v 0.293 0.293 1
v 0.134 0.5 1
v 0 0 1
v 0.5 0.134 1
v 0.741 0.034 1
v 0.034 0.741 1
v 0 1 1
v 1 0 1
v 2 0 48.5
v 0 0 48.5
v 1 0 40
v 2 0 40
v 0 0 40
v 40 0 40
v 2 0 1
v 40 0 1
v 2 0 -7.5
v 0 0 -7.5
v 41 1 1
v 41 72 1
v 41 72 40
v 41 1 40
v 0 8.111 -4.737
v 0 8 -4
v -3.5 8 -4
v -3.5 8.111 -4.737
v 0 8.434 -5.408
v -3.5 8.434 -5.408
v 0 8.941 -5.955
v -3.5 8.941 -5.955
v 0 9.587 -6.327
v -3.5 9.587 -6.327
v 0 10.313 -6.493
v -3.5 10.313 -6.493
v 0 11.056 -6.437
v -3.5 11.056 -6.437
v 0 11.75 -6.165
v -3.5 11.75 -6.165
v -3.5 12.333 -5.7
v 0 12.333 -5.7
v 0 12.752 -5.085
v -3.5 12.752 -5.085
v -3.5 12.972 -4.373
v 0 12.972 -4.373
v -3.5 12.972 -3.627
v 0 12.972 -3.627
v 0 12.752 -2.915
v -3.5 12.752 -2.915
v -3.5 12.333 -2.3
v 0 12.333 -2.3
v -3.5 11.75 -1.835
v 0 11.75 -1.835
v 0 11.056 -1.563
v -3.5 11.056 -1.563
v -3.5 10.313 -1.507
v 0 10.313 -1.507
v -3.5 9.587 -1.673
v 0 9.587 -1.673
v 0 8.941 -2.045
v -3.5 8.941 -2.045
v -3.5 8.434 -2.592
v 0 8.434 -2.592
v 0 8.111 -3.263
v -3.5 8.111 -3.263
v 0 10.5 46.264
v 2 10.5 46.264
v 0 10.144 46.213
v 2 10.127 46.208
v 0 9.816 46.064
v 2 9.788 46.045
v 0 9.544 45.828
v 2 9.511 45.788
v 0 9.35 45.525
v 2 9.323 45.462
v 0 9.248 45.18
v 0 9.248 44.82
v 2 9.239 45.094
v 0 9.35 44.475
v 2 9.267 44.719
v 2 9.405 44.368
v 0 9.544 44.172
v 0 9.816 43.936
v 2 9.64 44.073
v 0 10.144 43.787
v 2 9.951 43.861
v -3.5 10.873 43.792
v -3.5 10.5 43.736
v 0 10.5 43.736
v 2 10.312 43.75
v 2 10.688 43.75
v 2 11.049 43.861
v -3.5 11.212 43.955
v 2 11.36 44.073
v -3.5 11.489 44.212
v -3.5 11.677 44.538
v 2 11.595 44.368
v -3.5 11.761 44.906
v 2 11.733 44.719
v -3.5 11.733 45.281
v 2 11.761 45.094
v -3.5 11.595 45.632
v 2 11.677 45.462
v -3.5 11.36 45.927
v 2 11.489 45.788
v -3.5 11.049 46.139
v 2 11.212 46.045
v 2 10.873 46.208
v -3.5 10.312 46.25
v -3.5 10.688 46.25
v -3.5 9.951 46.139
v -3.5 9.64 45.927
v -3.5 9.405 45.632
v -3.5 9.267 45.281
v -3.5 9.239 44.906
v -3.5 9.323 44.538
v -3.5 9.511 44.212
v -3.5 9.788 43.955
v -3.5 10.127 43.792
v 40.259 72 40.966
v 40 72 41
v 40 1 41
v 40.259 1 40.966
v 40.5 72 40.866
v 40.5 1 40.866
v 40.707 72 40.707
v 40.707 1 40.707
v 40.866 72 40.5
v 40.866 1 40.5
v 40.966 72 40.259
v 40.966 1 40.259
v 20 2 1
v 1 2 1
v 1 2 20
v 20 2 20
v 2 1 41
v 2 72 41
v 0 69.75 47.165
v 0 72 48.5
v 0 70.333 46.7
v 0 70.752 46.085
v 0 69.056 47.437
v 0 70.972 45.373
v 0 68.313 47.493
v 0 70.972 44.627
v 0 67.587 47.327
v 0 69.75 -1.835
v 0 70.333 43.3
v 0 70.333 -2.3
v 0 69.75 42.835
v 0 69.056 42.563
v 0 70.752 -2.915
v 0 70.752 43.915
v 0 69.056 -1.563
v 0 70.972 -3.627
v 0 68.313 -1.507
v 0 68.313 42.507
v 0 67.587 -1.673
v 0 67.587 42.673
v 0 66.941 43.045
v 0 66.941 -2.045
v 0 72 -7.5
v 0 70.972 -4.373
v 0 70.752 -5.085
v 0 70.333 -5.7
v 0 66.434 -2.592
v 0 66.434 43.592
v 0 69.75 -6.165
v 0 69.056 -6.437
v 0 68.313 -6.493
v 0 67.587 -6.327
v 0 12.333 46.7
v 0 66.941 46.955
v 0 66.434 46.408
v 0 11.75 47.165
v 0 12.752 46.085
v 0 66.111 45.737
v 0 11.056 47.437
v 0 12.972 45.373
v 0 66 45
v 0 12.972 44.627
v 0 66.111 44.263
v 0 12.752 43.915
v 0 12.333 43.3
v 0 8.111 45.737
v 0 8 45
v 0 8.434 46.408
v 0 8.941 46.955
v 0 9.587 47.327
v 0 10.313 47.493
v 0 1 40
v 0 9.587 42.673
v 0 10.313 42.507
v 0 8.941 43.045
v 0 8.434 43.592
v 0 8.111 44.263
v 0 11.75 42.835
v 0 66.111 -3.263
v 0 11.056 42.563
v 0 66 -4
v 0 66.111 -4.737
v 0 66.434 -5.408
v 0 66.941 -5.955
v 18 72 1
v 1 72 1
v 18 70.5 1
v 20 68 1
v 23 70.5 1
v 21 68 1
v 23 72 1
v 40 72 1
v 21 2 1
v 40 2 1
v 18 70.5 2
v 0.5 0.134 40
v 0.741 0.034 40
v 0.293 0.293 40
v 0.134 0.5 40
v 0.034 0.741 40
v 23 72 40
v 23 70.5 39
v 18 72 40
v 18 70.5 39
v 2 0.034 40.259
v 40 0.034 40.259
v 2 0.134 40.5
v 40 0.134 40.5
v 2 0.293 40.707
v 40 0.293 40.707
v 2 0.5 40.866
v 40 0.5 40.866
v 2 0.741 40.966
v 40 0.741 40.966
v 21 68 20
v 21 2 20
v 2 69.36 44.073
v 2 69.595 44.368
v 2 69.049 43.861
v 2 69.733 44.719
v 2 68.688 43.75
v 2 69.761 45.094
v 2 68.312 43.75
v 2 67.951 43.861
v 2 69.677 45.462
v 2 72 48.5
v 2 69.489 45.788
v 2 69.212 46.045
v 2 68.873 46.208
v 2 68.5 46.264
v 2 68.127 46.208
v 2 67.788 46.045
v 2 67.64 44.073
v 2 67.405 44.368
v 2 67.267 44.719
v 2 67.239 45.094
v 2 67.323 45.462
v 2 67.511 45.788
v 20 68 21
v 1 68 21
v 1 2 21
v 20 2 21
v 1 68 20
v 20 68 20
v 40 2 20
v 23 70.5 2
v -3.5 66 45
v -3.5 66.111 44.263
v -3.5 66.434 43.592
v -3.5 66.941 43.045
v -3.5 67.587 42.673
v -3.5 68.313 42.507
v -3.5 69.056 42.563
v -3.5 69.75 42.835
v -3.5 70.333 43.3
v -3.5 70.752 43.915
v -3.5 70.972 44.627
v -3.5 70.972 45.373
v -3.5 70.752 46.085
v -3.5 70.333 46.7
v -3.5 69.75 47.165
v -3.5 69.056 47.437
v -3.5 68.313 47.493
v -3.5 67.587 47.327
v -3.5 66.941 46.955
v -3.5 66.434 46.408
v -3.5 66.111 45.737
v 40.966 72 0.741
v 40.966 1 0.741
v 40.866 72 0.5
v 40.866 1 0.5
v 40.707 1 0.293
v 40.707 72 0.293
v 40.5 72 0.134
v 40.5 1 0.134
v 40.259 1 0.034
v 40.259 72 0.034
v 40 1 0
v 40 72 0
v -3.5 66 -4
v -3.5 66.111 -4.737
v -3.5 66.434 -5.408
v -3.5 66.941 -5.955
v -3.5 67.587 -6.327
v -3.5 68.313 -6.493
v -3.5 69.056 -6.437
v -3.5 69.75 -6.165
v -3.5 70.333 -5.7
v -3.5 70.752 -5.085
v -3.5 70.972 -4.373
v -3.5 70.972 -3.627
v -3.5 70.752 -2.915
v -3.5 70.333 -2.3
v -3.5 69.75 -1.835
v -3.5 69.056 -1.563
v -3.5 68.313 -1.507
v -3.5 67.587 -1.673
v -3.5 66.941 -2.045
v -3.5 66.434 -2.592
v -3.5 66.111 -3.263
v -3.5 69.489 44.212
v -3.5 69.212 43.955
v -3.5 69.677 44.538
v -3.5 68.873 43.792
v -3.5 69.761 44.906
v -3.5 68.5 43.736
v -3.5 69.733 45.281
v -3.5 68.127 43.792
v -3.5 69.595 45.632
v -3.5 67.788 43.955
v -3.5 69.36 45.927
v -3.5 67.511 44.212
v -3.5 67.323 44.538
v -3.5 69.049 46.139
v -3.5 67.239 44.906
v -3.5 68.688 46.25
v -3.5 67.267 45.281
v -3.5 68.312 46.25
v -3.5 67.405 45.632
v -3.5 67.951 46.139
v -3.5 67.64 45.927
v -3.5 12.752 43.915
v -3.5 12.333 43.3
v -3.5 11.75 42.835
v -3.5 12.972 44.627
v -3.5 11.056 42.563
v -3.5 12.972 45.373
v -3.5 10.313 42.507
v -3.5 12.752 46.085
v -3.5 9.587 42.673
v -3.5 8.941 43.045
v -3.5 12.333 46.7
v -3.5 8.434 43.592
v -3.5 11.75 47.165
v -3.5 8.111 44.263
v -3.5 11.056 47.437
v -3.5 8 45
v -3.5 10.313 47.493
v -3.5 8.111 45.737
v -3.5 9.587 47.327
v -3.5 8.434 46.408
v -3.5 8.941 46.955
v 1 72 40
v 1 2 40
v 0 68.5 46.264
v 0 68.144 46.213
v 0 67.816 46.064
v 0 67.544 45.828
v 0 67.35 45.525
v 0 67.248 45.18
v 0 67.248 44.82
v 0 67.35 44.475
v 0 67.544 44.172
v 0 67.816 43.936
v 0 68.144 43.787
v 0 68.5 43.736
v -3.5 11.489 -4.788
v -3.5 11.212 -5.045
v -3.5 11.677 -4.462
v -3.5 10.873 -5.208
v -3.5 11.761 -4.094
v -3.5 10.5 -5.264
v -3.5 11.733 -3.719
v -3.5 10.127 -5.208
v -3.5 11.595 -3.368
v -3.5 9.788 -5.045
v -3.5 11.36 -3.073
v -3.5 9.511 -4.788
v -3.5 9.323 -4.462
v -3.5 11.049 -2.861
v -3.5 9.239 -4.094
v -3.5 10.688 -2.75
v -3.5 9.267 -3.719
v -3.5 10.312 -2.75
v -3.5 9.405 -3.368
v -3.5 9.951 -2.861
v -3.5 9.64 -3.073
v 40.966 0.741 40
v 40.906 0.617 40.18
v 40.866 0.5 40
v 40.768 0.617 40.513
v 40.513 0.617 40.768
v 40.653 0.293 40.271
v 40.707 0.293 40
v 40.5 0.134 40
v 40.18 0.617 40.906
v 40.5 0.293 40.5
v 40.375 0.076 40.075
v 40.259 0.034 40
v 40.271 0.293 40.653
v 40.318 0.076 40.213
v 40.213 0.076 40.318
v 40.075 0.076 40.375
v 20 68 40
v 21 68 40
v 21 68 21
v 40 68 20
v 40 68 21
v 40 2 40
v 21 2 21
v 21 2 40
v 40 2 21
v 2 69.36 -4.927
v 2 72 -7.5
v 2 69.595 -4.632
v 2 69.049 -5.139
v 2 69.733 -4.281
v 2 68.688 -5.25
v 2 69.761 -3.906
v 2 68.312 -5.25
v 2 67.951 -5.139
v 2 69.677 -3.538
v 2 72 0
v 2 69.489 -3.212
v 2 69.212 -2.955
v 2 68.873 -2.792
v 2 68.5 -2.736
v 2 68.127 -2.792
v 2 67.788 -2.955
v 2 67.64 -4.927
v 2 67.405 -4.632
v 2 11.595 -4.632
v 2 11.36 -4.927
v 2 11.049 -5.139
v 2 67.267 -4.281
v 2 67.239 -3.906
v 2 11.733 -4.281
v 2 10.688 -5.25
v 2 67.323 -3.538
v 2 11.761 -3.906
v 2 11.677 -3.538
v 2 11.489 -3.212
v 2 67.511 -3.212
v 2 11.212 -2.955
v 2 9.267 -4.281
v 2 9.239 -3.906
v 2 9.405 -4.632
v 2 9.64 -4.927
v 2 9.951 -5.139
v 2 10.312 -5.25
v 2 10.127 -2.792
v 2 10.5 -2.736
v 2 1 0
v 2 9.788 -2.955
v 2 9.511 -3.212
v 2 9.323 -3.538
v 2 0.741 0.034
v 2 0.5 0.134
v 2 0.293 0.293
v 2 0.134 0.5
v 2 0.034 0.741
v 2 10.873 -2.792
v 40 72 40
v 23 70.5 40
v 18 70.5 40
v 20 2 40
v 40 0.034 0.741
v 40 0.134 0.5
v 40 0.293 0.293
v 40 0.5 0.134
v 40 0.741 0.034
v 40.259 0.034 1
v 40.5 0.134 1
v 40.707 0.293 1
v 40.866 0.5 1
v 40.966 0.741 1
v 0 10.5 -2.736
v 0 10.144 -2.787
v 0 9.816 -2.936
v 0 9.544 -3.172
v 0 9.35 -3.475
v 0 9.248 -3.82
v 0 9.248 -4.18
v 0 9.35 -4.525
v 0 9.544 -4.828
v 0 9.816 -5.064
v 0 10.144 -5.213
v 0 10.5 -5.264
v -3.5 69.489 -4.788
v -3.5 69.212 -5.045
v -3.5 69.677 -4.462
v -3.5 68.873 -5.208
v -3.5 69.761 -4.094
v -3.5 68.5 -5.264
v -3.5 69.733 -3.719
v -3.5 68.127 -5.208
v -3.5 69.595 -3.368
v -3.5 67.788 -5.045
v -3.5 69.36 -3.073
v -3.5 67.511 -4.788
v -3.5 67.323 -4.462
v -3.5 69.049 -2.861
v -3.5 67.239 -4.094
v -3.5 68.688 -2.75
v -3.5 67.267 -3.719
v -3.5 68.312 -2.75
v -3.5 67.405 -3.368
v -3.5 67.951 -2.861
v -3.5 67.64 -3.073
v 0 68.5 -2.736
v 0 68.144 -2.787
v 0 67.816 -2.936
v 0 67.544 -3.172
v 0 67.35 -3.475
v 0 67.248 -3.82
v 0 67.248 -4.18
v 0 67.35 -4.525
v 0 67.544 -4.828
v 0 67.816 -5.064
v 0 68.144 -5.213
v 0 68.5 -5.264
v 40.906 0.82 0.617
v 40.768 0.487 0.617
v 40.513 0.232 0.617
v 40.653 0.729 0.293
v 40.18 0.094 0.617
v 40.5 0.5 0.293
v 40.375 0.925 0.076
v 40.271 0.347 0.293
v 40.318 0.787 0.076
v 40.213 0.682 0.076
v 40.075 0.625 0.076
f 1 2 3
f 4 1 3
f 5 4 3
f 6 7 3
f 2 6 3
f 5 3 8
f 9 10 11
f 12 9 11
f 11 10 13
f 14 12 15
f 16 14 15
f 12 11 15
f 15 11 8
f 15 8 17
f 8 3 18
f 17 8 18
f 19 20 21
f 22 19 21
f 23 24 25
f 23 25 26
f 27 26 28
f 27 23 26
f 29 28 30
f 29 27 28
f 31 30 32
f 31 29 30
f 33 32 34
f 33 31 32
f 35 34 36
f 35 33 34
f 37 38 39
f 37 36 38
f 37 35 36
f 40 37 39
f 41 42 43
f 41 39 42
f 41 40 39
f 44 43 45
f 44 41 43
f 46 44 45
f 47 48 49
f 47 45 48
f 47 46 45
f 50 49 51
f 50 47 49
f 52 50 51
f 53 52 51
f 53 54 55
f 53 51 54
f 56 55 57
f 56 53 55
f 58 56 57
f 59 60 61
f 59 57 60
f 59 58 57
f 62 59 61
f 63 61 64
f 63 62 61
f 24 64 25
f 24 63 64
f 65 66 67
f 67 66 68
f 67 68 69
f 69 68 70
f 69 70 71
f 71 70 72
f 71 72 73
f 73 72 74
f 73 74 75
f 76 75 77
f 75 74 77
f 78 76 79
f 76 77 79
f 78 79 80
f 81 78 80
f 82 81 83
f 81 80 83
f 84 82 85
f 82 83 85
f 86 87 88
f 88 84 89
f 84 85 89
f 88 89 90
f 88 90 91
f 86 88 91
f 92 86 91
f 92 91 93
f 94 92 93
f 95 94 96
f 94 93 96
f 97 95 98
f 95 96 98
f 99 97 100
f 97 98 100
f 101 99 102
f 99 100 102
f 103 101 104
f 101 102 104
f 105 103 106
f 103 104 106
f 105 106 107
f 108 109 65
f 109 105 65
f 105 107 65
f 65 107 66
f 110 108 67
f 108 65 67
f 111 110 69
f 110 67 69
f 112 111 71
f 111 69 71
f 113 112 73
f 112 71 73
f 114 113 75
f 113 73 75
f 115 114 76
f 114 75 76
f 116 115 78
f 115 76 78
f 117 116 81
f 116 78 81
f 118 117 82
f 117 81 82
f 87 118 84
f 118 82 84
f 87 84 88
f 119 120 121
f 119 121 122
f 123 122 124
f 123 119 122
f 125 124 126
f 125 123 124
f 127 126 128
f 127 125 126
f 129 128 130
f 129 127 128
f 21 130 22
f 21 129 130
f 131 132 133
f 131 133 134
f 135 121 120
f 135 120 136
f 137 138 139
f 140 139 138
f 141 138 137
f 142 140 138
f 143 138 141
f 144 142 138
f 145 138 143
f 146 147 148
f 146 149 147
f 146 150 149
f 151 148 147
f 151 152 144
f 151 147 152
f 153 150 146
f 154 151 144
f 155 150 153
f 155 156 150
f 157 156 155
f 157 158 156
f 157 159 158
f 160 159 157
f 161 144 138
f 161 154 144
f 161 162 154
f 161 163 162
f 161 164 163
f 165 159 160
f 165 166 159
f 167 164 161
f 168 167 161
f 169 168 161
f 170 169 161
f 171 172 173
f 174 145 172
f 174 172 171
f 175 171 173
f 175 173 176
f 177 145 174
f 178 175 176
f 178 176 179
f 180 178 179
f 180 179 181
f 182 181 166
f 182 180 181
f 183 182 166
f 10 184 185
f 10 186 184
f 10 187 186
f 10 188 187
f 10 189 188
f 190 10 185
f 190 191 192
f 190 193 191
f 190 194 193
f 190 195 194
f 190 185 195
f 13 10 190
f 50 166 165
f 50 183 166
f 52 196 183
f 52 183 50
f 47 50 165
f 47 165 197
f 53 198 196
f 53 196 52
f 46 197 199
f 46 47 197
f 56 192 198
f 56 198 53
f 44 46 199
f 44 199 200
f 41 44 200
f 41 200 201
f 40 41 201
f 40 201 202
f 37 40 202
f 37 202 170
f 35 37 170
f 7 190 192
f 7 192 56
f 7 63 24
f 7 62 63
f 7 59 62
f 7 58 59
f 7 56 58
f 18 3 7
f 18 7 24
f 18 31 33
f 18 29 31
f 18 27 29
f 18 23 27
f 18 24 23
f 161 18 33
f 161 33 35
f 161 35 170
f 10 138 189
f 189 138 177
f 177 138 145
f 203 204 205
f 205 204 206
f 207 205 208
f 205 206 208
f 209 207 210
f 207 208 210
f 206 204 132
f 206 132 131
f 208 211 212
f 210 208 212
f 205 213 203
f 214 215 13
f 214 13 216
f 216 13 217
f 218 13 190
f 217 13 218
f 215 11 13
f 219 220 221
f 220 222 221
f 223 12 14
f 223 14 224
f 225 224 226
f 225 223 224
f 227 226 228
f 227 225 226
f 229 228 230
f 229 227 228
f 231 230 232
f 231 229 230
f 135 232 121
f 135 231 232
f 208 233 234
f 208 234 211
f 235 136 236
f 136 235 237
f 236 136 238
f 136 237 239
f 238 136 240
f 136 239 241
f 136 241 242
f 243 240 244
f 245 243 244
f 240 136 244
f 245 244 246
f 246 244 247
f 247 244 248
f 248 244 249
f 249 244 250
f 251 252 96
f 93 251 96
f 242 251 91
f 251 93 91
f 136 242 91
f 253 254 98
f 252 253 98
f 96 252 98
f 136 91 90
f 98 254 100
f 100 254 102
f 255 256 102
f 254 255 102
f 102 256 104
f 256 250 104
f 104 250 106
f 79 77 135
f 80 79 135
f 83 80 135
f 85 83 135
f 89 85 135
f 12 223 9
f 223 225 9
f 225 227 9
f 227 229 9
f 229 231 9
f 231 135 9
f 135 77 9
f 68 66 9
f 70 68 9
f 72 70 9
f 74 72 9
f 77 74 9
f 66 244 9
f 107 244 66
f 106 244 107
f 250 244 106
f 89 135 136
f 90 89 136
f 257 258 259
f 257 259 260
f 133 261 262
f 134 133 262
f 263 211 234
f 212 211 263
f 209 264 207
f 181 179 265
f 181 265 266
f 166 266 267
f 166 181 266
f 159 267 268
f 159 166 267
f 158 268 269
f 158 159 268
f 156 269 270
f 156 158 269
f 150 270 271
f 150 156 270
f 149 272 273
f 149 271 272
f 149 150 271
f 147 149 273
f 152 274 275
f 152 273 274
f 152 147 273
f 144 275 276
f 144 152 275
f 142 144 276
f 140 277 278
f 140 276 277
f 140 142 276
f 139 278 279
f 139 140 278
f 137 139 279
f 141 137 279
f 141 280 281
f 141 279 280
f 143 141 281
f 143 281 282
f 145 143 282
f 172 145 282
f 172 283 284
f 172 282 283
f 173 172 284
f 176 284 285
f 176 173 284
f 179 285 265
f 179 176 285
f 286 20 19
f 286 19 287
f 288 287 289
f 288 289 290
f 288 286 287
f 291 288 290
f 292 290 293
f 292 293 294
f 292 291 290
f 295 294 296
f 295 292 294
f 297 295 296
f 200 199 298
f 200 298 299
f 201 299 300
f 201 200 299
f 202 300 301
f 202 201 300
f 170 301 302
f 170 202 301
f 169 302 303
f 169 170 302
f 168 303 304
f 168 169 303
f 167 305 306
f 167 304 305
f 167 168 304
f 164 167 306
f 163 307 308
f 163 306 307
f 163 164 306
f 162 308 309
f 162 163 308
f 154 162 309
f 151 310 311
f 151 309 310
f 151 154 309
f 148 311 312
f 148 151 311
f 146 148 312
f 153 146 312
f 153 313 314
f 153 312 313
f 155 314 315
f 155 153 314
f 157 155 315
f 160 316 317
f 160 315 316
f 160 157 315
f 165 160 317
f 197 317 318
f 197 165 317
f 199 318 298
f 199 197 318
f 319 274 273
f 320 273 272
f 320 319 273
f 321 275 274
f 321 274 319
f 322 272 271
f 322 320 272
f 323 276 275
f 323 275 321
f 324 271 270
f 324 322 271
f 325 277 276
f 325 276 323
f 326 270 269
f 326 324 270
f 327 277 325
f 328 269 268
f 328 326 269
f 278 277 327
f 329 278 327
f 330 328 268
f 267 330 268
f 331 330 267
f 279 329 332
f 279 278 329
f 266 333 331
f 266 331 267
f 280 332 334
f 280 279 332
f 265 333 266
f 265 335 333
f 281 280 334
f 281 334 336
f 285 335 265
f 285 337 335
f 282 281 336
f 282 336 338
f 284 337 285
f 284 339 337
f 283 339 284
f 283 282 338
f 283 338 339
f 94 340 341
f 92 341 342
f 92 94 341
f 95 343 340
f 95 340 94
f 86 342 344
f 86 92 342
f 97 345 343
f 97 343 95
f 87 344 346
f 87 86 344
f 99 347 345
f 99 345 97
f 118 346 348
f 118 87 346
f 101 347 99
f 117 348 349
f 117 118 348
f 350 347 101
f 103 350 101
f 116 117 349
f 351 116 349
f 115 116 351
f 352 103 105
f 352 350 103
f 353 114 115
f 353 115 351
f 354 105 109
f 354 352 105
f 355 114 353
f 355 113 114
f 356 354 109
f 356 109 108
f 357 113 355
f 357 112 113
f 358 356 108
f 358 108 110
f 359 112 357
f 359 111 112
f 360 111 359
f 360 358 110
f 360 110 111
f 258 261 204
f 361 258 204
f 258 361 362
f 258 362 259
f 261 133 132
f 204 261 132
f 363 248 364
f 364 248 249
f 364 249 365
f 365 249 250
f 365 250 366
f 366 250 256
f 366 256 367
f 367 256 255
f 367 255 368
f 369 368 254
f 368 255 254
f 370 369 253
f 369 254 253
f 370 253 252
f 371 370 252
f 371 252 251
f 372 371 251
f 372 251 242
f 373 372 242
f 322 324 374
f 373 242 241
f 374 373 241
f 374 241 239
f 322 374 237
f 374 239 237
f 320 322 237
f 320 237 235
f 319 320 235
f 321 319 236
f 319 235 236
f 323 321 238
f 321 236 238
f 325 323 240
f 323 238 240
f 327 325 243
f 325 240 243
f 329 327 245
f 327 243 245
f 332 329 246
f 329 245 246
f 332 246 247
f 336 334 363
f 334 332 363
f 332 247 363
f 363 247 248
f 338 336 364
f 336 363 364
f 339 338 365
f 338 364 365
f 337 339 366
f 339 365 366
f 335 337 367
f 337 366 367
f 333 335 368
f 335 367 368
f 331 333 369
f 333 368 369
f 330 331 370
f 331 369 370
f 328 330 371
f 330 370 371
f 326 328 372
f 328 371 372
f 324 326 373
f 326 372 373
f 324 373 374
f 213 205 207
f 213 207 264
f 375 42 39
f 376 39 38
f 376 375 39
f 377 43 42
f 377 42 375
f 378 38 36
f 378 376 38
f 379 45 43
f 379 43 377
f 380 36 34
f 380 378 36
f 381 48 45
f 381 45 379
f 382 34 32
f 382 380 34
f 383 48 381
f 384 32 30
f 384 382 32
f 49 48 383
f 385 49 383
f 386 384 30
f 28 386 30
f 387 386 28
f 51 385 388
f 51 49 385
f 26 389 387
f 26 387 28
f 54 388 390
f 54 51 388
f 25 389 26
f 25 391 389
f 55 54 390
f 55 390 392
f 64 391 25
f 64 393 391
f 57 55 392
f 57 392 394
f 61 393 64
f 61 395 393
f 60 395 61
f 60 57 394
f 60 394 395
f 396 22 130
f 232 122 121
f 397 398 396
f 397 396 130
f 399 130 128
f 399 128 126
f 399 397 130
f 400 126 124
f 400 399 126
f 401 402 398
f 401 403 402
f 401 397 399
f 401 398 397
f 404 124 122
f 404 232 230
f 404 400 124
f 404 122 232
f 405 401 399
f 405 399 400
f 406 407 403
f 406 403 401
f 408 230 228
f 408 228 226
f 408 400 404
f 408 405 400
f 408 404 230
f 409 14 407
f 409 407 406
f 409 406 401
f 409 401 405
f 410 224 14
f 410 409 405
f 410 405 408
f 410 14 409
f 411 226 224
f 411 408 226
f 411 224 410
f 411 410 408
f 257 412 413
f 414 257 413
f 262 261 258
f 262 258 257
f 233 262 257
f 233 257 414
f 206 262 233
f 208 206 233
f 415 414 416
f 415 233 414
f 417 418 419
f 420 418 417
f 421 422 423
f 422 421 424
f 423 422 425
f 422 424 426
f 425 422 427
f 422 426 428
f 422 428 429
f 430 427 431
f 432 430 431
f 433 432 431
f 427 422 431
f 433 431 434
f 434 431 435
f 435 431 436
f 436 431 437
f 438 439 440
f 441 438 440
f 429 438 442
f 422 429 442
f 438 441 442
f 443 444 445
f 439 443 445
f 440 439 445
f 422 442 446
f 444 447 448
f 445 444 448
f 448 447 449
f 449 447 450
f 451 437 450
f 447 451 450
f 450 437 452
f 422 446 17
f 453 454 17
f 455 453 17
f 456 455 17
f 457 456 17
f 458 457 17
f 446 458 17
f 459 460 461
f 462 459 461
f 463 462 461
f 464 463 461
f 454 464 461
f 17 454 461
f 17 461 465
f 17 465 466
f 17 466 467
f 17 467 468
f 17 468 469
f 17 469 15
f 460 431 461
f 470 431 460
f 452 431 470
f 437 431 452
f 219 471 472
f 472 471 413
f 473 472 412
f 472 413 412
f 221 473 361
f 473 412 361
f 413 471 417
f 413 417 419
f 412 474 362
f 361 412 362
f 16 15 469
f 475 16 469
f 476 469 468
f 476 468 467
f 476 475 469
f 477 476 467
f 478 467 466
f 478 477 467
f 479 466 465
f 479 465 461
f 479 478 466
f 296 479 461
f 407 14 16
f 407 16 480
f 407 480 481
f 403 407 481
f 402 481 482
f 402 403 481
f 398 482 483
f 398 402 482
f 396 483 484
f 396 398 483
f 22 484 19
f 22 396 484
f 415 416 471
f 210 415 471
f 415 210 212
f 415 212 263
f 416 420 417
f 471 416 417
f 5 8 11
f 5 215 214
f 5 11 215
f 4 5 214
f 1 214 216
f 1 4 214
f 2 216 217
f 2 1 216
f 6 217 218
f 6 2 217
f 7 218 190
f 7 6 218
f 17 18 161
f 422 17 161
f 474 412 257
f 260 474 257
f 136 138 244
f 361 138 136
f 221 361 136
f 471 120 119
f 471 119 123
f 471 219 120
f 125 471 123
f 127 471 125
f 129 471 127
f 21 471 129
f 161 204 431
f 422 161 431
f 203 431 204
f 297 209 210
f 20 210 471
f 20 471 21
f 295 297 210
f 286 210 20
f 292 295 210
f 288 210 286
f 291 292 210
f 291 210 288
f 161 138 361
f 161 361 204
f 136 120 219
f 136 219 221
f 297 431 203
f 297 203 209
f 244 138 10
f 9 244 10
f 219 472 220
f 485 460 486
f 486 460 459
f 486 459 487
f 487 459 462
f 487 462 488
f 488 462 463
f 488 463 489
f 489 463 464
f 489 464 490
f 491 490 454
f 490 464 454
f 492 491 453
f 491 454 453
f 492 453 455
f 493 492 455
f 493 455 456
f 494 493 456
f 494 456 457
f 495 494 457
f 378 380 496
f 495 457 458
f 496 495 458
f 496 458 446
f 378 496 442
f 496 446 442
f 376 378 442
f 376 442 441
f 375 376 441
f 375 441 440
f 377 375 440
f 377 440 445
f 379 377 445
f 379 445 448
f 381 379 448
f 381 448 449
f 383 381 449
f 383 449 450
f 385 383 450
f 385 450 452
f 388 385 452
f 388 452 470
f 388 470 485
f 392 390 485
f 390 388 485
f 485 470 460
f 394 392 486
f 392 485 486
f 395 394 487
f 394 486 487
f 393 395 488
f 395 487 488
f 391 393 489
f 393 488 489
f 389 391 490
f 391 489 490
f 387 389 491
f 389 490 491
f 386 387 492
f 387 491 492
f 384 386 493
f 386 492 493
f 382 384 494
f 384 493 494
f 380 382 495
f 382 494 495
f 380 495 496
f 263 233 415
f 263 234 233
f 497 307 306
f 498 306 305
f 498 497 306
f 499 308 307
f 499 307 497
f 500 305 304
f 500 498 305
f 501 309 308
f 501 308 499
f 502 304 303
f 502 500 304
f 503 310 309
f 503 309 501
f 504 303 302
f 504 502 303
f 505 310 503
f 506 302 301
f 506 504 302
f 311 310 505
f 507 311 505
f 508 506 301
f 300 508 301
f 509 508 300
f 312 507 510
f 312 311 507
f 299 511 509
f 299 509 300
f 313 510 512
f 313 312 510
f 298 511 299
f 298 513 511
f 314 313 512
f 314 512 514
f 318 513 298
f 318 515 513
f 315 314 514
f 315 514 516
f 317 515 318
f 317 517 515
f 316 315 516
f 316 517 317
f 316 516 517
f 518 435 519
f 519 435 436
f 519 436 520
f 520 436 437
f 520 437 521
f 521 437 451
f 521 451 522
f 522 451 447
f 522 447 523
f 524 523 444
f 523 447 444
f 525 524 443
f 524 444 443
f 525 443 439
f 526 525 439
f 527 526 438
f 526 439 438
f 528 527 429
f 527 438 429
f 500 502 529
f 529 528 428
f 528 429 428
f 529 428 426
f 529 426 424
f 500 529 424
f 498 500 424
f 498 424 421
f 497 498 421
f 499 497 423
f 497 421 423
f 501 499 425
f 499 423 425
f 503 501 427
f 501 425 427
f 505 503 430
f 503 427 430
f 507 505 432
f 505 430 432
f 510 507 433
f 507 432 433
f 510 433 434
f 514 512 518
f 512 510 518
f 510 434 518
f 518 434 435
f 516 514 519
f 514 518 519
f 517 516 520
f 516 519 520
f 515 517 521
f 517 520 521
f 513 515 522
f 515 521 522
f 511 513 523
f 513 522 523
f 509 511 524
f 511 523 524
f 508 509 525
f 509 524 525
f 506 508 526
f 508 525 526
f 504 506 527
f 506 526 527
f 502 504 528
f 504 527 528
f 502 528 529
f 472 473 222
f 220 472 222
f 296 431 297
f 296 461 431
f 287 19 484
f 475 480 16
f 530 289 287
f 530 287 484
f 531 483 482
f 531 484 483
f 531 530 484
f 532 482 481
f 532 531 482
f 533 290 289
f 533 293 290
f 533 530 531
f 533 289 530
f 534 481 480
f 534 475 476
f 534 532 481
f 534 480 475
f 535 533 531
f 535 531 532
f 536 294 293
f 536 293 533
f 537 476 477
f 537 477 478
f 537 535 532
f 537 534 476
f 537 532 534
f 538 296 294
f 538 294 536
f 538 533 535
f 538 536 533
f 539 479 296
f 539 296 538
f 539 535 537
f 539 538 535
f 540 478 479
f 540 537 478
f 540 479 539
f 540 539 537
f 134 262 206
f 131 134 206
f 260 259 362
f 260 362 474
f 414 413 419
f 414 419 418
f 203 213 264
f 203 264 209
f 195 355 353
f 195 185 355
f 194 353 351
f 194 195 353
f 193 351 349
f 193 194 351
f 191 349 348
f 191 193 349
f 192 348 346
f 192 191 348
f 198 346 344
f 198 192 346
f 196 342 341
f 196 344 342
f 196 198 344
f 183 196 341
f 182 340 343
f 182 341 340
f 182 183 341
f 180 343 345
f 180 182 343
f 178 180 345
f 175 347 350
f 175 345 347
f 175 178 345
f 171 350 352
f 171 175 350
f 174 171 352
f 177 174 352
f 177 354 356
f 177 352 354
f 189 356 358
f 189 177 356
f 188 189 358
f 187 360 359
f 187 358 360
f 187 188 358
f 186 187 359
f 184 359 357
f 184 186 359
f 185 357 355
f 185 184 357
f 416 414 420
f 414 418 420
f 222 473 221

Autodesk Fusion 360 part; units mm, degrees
sketch "Sketch1" plane through (0, 0, 0) normal (0, 1, 0) x (1, 0, 0)
  line L0 (0, 0) -> (41, 0)
  line L1 (41, 0) -> (41, -41)
  line L2 (41, -41) -> (0, -41)
  line L3 (0, -41) -> (0, 0)
  line L4 (1, -1) -> (40, -1)
  line L5 (40, -1) -> (40, -40)
  line L6 (40, -40) -> (1, -40)
  line L7 (1, -40) -> (1, -1)
  line L8 (20, -40) -> (20, -1)
  line L9 (21, -40) -> (21, -1)
  line L10 (1, -21) -> (20, -21)
  line L11 (1, -20) -> (20, -20)
  line L12 (21, -21) -> (40, -21)
  line L13 (21, -20) -> (40, -20)
  dimension "d1" = 41
  dimension "d2" = 41
  dimension "d3" = 39
  dimension "d4" = 1
  dimension "d5" = 1
  dimension "d6" = 19
  dimension "d7" = 19
  dimension "d8" = 1
  dimension "d9" = 1
  dimension "d10" = 19
  dimension "d11" = 19
extrude "Extrude1" add sketch "Sketch1" along normal blind 68 contours L4 L6 L8 L9 | L7 L8 L10 L11 | L5 L9 L12 L13
extrude "Extrude2" add sketch "Sketch1" along normal blind 72
extrude "Extrude3" add sketch "Sketch1" along normal blind 2 contours L4 L7 L8 L11 | L4 L5 L9 L13 | L6 L7 L8 L10 | L5 L6 L9 L12
ref_plane "WorkPlane1" through (18, 37, 20.5) normal (1, 0, 0) x (0, 0, -1)
sketch "Sketch6" plane through (18, 0, 0) normal (1, 0, 0) x (0, 1, 0)
  line L0 (72, 40) -> (70.5, 40)
  line L1 (70.5, 40) -> (70.5, 39)
  line L2 (70.5, 39) -> (72, 40)
  line L3 (72, 1) -> (70.5, 1)
  line L4 (70.5, 1) -> (70.5, 2)
  line L5 (70.5, 2) -> (72, 1)
extrude "Extrude4" add sketch "Sketch6" along normal blind 5
fillet "Fillet1" radius 1 1 edges at (41, 36, 41)
fillet "Fillet2" radius 1 1 edges at (0, 36, 41)
fillet "Fillet3" radius 1 5 edges at (41, 0, 20) (40.7071, 0, 40.7071) (20.5, 0, 41) (0.2929, 0, 40.7071) (0, 0, 20)
fillet "Fillet4" radius 1 5 edges at (41, 36.5, 0) (40.7071, 0.2929, 0) (20.5, 0, 0) (0.2929, 0.2929, 0) (0, 36.5, 0)
sketch "Sketch8" plane through (0, 0, 0) normal (-1, 0, 0) x (0, -1, 0)
  line L0 (-72, 1) -> (-1, 1)
  line L1 (-1, 1) -> (-1, 40)
  line L2 (-1, 40) -> (-72, 40)
  line L3 (-72, 40) -> (-72, 1)
  line L4 (-72, 1) -> (0, 1)
  line L5 (0, 1) -> (0, -7.5)
  line L6 (0, -7.5) -> (-72, -7.5)
  line L7 (-72, -7.5) -> (-72, 1)
  line L8 (0, 40) -> (-72, 40)
  line L9 (-72, 40) -> (-72, 48.5)
  line L10 (-72, 48.5) -> (0, 48.5)
  line L11 (0, 48.5) -> (0, 40)
  circle A0 centre (-68.5, 45) radius 2.5
  circle A1 centre (-10.5, 45) radius 2.5
  circle A2 centre (-68.5, -4) radius 2.5
  circle A3 centre (-10.5, -4) radius 2.5
  dimension "d41" = 8.5
  dimension "d42" = 8.5
  dimension "d44" = 5
  dimension "d45" = 5
  dimension "d46" = 5
  dimension "d47" = 5
  dimension "d48" = 3.5
  dimension "d49" = 3.5
  dimension "d50" = 3.5
  dimension "d51" = 3.5
  dimension "d52" = 3.5
  dimension "d53" = 3.5
  dimension "d54" = 58
  dimension "d55" = 58
extrude "Extrude5" add sketch "Sketch8" along normal blind 0 and the other way blind 2 contours L0 L4 L5 L6 L7 | L2 L8 L9 L10 L11 | A0 | A1 | A2 | A3
extrude "Extrude6" add sketch "Sketch8" along normal blind 3.5 contours A0 | A1 | A2 | A3
hole "Hole1" at (0, 68.5, 45) direction (-1, 0, 0) diameter 2.076 depth 6 tip angle 180
thread "Thread1" "ISO Metric profile 2.5 M2.5x0.45 6H" thread offset 0 thread depth 7.4
hole "Hole2" at (0, 68.5, 45) direction (1, 0, 0) diameter 2.076 depth 2.5 tip angle 180
thread "Thread2" "ISO Metric profile 2.5 M2.5x0.45 6H" thread offset 0 thread depth 7.4
hole "Hole3" at (0, 10.5, 45) direction (1, 0, 0) diameter 2.076 depth 11 tip angle 180
thread "Thread3" "ISO Metric profile 2.5 M2.5x0.45 6H" thread offset 0 thread depth 7.4
hole "Hole4" at (0, 10.5, 45) direction (-1, 0, 0) diameter 2.076 depth 11 tip angle 180
thread "Thread4" "ISO Metric profile 2.5 M2.5x0.45 6H" thread offset 0 thread depth 7.4
hole "Hole5" at (0, 10.5, -4) direction (1, 0, 0) diameter 2.076 depth 9 tip angle 180
thread "Thread5" "ISO Metric profile 2.5 M2.5x0.45 6H" thread offset 0 thread depth 7.4
hole "Hole6" at (0, 10.5, -4) direction (-1, 0, 0) diameter 2.076 depth 9 tip angle 180
thread "Thread6" "ISO Metric profile 2.5 M2.5x0.45 6H" thread offset 0 thread depth 7.4
hole "Hole7" at (0, 68.5, -4) direction (1, 0, 0) diameter 2.076 depth 9 tip angle 180
thread "Thread7" "ISO Metric profile 2.5 M2.5x0.45 6H" thread offset 0 thread depth 7.4
hole "Hole8" at (0, 68.5, -4) direction (-1, 0, 0) diameter 2.076 depth 9 tip angle 180
thread "Thread8" "ISO Metric profile 2.5 M2.5x0.45 6H" thread offset 0 thread depth 7.4
hole "Hole9" at (0, 68.5, 45) at (0, 10.5, 45) at (0, 10.5, -4) at (0, 68.5, -4) direction (-1, 0, 0) diameter 2.529 end through all
thread "Thread9" "ISO Metric profile 3.0 M3x0.5 6H" thread offset 0 thread depth 7.4
hole "Hole10" at (0, 10.5, 45) at (0, 68.5, 45) at (0, 10.5, -4) at (0, 68.5, -4) direction (1, 0, 0) diameter 2.529 depth 6 tip angle 180
thread "Thread10" "ISO Metric profile 3.0 M3x0.5 6H" thread offset 0 thread depth 7.4
